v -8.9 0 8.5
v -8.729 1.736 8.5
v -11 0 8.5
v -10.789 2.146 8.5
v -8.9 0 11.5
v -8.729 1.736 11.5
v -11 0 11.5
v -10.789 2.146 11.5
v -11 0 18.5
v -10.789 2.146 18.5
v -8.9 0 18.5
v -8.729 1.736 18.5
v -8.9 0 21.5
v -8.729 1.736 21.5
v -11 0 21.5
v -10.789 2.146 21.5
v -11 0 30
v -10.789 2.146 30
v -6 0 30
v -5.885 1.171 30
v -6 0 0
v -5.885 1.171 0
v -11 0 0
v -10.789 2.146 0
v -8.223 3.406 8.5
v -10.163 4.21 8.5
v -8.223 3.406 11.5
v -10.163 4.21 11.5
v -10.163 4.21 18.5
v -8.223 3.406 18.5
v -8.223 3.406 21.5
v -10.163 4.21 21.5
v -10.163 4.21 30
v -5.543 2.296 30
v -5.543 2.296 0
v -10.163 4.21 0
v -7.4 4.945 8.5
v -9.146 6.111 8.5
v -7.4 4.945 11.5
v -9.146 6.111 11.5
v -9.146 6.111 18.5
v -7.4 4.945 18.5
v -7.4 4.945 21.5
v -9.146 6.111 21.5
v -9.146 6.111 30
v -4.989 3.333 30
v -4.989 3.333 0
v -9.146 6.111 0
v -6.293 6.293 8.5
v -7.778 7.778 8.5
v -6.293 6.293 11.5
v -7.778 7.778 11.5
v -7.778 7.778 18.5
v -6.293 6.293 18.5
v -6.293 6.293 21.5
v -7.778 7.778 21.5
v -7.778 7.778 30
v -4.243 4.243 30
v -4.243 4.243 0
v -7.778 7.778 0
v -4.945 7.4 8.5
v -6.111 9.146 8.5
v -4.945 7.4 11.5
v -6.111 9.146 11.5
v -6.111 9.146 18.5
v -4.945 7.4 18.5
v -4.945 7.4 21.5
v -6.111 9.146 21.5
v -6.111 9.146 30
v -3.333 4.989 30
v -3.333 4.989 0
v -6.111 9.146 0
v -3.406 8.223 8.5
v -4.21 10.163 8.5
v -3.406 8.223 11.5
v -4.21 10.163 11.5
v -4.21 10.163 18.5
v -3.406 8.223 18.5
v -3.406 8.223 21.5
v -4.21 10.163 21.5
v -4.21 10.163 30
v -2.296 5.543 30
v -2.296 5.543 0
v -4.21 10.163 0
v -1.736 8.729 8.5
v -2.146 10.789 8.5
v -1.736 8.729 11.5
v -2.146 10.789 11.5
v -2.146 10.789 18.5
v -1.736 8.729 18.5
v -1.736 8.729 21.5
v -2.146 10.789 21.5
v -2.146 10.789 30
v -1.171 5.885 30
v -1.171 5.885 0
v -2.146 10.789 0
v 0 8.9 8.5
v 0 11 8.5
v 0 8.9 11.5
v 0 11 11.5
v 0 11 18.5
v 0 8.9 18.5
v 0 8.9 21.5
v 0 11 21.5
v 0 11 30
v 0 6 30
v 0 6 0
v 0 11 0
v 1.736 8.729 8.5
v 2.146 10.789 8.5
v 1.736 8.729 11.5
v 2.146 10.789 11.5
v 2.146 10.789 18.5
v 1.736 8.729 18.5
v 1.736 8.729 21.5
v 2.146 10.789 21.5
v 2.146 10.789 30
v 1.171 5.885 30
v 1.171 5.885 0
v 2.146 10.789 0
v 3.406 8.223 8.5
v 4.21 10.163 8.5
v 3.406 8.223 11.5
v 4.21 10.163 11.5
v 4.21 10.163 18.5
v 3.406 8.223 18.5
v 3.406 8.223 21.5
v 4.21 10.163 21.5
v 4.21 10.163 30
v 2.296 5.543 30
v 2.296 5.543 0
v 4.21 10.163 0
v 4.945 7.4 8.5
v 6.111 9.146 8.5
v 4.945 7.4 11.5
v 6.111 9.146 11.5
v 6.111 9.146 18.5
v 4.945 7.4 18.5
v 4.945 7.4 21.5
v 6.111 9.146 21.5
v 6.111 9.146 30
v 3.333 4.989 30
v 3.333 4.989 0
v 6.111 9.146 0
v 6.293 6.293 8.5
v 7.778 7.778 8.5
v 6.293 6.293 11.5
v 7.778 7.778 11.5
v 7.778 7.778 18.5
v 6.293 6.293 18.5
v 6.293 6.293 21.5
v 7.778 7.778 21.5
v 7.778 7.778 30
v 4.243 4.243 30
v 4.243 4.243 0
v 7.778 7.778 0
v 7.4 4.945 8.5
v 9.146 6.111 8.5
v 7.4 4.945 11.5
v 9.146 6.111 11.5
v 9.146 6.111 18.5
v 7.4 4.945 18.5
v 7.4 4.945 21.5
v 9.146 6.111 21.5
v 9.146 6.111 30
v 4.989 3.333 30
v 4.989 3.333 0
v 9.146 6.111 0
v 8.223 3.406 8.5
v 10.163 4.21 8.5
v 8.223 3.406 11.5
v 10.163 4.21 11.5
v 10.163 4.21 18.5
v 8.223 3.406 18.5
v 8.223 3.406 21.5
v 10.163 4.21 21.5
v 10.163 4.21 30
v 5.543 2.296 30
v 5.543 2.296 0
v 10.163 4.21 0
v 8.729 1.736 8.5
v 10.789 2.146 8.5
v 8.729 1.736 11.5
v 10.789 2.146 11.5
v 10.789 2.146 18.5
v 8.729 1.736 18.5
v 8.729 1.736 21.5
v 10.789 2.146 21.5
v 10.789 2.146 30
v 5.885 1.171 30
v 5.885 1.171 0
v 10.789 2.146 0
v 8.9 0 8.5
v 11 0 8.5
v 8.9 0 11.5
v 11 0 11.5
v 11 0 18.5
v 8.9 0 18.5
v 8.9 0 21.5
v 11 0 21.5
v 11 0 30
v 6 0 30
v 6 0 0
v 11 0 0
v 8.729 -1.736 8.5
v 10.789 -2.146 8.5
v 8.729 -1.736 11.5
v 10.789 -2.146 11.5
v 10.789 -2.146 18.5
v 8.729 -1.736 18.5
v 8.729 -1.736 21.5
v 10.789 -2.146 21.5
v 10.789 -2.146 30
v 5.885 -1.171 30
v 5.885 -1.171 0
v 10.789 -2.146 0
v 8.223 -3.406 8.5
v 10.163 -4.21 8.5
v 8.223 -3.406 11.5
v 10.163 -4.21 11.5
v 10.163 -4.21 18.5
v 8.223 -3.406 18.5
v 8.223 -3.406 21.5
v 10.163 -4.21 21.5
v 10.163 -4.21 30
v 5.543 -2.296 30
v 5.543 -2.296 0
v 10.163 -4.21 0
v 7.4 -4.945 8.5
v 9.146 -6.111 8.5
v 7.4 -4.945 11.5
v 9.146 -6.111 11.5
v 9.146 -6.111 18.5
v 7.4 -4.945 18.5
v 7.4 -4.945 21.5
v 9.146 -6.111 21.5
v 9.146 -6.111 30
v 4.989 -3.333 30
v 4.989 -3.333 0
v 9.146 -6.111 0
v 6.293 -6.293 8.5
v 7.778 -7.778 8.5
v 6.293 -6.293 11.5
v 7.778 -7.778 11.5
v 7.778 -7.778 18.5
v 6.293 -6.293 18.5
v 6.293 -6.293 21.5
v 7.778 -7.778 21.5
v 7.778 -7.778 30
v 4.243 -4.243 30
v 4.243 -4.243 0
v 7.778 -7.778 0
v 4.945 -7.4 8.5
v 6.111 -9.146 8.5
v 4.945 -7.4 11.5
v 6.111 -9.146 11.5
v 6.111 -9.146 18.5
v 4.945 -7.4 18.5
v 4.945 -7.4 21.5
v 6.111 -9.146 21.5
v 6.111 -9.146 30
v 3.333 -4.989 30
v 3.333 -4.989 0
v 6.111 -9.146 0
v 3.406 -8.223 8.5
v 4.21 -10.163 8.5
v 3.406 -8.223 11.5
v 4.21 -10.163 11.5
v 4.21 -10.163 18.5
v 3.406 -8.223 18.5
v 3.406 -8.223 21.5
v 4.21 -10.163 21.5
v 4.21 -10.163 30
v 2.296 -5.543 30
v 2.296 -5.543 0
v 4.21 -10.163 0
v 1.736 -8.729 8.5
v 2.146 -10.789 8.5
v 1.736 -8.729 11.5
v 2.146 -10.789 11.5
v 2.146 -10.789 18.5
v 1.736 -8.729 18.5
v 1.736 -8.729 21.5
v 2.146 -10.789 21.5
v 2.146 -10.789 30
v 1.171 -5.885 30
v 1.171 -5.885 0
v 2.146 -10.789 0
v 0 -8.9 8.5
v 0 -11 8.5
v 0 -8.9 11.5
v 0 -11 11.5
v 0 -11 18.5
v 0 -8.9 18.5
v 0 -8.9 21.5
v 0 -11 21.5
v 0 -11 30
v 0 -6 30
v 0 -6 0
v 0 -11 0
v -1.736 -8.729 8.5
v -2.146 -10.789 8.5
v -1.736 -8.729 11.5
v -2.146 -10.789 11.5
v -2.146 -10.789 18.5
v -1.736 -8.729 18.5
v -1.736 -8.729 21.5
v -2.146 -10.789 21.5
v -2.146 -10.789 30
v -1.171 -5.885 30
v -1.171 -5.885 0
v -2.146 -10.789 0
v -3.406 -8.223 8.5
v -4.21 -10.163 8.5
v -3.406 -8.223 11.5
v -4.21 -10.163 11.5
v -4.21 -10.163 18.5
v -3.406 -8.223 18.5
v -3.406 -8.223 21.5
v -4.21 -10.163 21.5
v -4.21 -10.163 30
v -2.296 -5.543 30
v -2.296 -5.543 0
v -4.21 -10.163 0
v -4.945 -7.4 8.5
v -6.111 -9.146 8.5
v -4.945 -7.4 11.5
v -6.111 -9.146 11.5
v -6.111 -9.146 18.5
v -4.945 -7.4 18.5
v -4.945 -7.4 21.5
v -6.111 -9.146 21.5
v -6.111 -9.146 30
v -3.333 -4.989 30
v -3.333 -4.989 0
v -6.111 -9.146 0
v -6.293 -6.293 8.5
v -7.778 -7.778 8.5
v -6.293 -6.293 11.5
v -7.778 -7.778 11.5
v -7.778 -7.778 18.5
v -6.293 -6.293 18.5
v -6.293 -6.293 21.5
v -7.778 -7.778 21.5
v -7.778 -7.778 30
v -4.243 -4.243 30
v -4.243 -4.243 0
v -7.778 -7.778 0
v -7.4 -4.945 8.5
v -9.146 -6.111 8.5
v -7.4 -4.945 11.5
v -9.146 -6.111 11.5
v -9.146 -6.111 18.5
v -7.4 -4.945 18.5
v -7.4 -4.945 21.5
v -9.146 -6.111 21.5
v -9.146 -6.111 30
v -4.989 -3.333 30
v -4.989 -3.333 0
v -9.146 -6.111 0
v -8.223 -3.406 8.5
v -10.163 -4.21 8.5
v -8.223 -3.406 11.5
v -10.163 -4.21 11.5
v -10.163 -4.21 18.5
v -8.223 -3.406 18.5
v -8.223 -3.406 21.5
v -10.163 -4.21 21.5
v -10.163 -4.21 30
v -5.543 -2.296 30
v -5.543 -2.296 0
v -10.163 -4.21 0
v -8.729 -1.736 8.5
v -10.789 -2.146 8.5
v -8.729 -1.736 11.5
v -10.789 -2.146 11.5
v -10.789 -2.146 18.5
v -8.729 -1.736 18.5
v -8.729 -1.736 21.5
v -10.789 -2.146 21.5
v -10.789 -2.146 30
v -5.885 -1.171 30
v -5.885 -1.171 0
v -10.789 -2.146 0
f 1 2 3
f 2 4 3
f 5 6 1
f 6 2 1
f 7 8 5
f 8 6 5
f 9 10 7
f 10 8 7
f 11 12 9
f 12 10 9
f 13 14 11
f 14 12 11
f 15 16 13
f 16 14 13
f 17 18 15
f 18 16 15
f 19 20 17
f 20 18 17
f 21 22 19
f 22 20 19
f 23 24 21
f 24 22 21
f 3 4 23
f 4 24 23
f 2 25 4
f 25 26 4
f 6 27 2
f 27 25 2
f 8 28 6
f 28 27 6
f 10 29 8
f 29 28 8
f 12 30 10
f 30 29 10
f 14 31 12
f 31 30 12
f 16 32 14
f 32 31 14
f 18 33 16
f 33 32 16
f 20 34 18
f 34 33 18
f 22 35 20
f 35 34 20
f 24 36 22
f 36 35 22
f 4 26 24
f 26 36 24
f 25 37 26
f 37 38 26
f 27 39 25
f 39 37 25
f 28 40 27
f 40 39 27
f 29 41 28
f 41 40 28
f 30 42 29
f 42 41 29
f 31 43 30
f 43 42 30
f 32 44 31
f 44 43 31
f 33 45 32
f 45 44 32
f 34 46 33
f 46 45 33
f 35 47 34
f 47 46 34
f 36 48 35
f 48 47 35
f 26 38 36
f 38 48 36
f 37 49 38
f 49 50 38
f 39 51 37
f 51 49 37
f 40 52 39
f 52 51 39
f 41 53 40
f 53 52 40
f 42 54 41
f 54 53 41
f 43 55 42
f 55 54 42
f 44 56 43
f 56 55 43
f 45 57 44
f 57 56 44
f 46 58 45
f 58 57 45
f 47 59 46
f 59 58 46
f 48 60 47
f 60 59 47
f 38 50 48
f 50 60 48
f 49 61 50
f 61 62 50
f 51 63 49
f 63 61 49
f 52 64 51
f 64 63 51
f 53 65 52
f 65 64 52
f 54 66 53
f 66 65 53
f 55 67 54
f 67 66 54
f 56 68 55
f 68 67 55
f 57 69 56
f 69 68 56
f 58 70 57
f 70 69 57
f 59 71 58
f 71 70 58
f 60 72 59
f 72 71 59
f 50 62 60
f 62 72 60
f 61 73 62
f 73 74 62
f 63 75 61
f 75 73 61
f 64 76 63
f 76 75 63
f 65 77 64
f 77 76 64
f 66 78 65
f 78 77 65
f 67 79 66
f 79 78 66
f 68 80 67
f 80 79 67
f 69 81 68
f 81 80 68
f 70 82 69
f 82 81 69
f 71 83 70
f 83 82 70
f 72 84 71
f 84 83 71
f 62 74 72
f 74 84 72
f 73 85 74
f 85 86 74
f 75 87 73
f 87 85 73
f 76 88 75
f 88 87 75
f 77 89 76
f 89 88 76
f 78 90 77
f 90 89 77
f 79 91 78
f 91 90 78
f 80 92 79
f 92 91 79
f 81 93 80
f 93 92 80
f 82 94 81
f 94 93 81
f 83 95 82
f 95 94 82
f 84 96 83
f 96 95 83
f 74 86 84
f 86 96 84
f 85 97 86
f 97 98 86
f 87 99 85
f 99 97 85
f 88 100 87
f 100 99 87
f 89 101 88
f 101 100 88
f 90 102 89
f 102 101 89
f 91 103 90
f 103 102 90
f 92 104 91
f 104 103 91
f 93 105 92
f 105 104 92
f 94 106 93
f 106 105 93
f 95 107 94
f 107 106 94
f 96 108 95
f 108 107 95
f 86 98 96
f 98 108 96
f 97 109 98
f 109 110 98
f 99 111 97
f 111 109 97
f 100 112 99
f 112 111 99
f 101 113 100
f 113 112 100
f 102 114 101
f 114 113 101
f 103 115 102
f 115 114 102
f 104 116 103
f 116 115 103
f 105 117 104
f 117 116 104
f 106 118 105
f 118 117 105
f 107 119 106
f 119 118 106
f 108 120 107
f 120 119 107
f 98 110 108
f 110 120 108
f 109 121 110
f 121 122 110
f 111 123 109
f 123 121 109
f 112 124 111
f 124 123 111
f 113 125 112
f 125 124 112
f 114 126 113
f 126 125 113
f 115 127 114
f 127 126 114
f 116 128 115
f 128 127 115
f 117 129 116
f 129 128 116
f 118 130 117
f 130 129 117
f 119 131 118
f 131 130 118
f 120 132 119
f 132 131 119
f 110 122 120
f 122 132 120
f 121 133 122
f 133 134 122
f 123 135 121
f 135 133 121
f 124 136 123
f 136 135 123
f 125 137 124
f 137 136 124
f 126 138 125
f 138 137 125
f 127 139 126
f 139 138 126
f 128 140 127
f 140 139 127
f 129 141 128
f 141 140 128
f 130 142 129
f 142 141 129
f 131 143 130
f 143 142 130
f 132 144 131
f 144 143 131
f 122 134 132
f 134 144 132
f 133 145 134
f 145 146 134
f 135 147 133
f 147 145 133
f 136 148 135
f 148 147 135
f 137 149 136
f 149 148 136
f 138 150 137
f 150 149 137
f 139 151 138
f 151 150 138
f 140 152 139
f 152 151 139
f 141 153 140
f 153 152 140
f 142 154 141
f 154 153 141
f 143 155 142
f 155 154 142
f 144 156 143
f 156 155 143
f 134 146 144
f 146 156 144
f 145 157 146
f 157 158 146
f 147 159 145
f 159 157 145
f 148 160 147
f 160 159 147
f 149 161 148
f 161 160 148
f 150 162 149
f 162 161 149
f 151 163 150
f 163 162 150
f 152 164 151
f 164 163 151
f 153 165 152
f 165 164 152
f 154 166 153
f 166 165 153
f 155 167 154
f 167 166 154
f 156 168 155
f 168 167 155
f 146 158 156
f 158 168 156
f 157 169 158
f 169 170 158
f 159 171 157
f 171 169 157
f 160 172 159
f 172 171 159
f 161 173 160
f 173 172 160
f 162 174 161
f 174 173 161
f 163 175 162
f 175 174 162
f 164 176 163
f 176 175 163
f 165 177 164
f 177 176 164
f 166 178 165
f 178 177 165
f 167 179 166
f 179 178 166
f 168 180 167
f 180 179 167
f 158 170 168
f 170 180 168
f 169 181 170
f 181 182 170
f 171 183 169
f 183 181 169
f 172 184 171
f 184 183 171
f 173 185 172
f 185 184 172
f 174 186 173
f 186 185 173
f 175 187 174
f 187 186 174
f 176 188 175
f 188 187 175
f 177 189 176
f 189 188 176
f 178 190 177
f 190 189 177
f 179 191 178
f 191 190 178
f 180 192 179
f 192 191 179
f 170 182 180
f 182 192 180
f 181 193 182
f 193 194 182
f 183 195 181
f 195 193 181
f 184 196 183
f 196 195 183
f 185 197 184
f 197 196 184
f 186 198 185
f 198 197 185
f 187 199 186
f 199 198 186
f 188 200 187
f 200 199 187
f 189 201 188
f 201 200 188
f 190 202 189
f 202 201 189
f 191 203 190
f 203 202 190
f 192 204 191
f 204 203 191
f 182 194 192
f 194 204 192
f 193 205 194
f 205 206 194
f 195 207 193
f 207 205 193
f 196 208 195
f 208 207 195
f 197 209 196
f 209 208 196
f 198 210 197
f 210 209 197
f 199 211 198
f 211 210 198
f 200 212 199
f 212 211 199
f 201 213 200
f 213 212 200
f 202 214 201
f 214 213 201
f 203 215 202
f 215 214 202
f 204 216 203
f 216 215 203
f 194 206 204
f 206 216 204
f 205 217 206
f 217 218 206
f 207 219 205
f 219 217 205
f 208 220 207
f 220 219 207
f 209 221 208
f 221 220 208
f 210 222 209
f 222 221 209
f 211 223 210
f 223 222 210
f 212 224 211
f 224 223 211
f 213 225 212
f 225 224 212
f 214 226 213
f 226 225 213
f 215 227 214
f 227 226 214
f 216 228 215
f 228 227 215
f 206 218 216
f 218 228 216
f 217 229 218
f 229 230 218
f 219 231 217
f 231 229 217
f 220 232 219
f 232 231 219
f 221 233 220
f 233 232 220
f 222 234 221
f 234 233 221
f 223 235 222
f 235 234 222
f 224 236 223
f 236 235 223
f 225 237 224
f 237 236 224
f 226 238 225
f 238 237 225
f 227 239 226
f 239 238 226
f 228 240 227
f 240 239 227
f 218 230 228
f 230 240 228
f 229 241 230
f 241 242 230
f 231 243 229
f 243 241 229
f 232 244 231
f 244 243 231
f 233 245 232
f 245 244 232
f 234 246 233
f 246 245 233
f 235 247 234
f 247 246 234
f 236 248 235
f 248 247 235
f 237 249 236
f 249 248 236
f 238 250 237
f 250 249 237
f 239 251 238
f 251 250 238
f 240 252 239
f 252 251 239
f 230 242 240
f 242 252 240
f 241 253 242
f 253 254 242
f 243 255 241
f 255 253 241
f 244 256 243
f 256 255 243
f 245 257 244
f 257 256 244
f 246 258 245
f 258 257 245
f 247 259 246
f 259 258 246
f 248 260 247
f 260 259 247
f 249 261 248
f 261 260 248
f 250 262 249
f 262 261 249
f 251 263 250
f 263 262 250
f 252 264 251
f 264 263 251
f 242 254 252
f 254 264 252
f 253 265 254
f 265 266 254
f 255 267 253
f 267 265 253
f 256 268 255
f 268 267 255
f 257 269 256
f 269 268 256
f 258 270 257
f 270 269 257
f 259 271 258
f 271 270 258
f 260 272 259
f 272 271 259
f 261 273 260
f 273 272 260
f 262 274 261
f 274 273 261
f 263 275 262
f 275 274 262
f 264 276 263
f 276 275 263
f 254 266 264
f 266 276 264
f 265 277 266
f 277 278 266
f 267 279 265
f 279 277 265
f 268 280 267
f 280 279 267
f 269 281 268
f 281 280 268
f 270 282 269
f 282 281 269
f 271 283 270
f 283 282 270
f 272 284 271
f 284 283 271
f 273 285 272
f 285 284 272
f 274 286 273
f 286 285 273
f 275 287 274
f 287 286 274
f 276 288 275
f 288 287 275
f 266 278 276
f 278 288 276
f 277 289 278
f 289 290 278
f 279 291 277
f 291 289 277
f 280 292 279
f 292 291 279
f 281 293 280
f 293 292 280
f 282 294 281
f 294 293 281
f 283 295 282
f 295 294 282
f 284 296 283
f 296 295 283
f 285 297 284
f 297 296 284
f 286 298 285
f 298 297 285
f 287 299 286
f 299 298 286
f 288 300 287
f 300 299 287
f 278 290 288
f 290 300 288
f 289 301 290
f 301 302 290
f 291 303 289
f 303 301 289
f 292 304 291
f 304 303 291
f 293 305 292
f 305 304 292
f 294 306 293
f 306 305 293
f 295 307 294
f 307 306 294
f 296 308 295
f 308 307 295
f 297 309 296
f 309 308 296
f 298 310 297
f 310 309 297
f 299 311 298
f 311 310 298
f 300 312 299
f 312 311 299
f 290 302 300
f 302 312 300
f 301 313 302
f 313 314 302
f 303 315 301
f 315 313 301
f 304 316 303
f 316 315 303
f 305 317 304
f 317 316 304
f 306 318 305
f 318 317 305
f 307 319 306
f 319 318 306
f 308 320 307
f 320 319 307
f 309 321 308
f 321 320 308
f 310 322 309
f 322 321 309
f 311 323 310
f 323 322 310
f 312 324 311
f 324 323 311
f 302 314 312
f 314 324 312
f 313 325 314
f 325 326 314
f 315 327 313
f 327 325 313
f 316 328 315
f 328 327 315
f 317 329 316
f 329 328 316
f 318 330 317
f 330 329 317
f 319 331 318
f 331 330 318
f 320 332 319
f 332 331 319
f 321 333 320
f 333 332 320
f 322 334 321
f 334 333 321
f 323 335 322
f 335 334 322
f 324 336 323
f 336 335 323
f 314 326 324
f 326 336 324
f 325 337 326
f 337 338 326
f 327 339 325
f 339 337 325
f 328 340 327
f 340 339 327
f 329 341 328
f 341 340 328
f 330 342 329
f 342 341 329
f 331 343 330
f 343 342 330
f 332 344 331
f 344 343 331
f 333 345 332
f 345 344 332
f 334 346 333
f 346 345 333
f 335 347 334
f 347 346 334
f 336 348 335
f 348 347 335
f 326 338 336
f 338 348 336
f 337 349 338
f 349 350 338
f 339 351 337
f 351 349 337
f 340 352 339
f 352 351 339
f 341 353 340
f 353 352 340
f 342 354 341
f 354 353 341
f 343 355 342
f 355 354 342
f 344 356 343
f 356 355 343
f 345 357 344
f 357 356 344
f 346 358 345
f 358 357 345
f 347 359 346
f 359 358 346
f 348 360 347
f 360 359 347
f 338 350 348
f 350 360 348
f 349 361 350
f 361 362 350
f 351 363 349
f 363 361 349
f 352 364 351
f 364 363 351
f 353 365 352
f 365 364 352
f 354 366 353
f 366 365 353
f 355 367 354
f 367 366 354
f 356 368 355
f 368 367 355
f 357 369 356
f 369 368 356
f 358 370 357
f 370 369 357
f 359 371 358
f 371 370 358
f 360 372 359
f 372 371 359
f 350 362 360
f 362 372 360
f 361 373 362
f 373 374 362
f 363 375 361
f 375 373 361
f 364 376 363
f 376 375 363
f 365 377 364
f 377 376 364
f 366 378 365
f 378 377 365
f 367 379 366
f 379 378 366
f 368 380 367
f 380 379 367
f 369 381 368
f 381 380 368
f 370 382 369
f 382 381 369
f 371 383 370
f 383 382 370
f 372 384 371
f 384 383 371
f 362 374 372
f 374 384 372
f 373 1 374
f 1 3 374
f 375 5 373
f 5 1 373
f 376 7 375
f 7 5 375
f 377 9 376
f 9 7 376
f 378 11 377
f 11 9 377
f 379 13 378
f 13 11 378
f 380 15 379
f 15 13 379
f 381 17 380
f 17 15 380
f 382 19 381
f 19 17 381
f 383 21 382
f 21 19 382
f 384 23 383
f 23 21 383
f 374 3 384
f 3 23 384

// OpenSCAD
$fn = 32;

// ----------------------------------------------------------------------
// Grooved revolve: stepped, bore R6
// ----------------------------------------------------------------------

// --- parameters (mm) ---
bore_r = 6;               // bore radius
outer_r = 11;             // outer radius of the body
total_h = 30;             // overall height, Z
wall = 5;                 // radial wall thickness
groove_w = 3;             // groove width
groove_d = 2.1;           // groove depth
grooves = 2;              // number of outer grooves

bbox_x = 2 * outer_r;  // full diameter
bore_d = 2 * bore_r;  // bore diameter
body_d = 2 * outer_r;  // body diameter
revolve_angle = 360;  // full turn around the Z axis

profile = [[6, 0], [11, 0], [11, 8.5], [8.9, 8.5], [8.9, 11.5], [11, 11.5], [11, 18.5], [8.9, 18.5], [8.9, 21.5], [11, 21.5], [11, 30], [6, 30]];  // primary outline, 12 points, counter clockwise

// --- the one profile operation ---
rotate_extrude(angle = revolve_angle) polygon(points = profile);
